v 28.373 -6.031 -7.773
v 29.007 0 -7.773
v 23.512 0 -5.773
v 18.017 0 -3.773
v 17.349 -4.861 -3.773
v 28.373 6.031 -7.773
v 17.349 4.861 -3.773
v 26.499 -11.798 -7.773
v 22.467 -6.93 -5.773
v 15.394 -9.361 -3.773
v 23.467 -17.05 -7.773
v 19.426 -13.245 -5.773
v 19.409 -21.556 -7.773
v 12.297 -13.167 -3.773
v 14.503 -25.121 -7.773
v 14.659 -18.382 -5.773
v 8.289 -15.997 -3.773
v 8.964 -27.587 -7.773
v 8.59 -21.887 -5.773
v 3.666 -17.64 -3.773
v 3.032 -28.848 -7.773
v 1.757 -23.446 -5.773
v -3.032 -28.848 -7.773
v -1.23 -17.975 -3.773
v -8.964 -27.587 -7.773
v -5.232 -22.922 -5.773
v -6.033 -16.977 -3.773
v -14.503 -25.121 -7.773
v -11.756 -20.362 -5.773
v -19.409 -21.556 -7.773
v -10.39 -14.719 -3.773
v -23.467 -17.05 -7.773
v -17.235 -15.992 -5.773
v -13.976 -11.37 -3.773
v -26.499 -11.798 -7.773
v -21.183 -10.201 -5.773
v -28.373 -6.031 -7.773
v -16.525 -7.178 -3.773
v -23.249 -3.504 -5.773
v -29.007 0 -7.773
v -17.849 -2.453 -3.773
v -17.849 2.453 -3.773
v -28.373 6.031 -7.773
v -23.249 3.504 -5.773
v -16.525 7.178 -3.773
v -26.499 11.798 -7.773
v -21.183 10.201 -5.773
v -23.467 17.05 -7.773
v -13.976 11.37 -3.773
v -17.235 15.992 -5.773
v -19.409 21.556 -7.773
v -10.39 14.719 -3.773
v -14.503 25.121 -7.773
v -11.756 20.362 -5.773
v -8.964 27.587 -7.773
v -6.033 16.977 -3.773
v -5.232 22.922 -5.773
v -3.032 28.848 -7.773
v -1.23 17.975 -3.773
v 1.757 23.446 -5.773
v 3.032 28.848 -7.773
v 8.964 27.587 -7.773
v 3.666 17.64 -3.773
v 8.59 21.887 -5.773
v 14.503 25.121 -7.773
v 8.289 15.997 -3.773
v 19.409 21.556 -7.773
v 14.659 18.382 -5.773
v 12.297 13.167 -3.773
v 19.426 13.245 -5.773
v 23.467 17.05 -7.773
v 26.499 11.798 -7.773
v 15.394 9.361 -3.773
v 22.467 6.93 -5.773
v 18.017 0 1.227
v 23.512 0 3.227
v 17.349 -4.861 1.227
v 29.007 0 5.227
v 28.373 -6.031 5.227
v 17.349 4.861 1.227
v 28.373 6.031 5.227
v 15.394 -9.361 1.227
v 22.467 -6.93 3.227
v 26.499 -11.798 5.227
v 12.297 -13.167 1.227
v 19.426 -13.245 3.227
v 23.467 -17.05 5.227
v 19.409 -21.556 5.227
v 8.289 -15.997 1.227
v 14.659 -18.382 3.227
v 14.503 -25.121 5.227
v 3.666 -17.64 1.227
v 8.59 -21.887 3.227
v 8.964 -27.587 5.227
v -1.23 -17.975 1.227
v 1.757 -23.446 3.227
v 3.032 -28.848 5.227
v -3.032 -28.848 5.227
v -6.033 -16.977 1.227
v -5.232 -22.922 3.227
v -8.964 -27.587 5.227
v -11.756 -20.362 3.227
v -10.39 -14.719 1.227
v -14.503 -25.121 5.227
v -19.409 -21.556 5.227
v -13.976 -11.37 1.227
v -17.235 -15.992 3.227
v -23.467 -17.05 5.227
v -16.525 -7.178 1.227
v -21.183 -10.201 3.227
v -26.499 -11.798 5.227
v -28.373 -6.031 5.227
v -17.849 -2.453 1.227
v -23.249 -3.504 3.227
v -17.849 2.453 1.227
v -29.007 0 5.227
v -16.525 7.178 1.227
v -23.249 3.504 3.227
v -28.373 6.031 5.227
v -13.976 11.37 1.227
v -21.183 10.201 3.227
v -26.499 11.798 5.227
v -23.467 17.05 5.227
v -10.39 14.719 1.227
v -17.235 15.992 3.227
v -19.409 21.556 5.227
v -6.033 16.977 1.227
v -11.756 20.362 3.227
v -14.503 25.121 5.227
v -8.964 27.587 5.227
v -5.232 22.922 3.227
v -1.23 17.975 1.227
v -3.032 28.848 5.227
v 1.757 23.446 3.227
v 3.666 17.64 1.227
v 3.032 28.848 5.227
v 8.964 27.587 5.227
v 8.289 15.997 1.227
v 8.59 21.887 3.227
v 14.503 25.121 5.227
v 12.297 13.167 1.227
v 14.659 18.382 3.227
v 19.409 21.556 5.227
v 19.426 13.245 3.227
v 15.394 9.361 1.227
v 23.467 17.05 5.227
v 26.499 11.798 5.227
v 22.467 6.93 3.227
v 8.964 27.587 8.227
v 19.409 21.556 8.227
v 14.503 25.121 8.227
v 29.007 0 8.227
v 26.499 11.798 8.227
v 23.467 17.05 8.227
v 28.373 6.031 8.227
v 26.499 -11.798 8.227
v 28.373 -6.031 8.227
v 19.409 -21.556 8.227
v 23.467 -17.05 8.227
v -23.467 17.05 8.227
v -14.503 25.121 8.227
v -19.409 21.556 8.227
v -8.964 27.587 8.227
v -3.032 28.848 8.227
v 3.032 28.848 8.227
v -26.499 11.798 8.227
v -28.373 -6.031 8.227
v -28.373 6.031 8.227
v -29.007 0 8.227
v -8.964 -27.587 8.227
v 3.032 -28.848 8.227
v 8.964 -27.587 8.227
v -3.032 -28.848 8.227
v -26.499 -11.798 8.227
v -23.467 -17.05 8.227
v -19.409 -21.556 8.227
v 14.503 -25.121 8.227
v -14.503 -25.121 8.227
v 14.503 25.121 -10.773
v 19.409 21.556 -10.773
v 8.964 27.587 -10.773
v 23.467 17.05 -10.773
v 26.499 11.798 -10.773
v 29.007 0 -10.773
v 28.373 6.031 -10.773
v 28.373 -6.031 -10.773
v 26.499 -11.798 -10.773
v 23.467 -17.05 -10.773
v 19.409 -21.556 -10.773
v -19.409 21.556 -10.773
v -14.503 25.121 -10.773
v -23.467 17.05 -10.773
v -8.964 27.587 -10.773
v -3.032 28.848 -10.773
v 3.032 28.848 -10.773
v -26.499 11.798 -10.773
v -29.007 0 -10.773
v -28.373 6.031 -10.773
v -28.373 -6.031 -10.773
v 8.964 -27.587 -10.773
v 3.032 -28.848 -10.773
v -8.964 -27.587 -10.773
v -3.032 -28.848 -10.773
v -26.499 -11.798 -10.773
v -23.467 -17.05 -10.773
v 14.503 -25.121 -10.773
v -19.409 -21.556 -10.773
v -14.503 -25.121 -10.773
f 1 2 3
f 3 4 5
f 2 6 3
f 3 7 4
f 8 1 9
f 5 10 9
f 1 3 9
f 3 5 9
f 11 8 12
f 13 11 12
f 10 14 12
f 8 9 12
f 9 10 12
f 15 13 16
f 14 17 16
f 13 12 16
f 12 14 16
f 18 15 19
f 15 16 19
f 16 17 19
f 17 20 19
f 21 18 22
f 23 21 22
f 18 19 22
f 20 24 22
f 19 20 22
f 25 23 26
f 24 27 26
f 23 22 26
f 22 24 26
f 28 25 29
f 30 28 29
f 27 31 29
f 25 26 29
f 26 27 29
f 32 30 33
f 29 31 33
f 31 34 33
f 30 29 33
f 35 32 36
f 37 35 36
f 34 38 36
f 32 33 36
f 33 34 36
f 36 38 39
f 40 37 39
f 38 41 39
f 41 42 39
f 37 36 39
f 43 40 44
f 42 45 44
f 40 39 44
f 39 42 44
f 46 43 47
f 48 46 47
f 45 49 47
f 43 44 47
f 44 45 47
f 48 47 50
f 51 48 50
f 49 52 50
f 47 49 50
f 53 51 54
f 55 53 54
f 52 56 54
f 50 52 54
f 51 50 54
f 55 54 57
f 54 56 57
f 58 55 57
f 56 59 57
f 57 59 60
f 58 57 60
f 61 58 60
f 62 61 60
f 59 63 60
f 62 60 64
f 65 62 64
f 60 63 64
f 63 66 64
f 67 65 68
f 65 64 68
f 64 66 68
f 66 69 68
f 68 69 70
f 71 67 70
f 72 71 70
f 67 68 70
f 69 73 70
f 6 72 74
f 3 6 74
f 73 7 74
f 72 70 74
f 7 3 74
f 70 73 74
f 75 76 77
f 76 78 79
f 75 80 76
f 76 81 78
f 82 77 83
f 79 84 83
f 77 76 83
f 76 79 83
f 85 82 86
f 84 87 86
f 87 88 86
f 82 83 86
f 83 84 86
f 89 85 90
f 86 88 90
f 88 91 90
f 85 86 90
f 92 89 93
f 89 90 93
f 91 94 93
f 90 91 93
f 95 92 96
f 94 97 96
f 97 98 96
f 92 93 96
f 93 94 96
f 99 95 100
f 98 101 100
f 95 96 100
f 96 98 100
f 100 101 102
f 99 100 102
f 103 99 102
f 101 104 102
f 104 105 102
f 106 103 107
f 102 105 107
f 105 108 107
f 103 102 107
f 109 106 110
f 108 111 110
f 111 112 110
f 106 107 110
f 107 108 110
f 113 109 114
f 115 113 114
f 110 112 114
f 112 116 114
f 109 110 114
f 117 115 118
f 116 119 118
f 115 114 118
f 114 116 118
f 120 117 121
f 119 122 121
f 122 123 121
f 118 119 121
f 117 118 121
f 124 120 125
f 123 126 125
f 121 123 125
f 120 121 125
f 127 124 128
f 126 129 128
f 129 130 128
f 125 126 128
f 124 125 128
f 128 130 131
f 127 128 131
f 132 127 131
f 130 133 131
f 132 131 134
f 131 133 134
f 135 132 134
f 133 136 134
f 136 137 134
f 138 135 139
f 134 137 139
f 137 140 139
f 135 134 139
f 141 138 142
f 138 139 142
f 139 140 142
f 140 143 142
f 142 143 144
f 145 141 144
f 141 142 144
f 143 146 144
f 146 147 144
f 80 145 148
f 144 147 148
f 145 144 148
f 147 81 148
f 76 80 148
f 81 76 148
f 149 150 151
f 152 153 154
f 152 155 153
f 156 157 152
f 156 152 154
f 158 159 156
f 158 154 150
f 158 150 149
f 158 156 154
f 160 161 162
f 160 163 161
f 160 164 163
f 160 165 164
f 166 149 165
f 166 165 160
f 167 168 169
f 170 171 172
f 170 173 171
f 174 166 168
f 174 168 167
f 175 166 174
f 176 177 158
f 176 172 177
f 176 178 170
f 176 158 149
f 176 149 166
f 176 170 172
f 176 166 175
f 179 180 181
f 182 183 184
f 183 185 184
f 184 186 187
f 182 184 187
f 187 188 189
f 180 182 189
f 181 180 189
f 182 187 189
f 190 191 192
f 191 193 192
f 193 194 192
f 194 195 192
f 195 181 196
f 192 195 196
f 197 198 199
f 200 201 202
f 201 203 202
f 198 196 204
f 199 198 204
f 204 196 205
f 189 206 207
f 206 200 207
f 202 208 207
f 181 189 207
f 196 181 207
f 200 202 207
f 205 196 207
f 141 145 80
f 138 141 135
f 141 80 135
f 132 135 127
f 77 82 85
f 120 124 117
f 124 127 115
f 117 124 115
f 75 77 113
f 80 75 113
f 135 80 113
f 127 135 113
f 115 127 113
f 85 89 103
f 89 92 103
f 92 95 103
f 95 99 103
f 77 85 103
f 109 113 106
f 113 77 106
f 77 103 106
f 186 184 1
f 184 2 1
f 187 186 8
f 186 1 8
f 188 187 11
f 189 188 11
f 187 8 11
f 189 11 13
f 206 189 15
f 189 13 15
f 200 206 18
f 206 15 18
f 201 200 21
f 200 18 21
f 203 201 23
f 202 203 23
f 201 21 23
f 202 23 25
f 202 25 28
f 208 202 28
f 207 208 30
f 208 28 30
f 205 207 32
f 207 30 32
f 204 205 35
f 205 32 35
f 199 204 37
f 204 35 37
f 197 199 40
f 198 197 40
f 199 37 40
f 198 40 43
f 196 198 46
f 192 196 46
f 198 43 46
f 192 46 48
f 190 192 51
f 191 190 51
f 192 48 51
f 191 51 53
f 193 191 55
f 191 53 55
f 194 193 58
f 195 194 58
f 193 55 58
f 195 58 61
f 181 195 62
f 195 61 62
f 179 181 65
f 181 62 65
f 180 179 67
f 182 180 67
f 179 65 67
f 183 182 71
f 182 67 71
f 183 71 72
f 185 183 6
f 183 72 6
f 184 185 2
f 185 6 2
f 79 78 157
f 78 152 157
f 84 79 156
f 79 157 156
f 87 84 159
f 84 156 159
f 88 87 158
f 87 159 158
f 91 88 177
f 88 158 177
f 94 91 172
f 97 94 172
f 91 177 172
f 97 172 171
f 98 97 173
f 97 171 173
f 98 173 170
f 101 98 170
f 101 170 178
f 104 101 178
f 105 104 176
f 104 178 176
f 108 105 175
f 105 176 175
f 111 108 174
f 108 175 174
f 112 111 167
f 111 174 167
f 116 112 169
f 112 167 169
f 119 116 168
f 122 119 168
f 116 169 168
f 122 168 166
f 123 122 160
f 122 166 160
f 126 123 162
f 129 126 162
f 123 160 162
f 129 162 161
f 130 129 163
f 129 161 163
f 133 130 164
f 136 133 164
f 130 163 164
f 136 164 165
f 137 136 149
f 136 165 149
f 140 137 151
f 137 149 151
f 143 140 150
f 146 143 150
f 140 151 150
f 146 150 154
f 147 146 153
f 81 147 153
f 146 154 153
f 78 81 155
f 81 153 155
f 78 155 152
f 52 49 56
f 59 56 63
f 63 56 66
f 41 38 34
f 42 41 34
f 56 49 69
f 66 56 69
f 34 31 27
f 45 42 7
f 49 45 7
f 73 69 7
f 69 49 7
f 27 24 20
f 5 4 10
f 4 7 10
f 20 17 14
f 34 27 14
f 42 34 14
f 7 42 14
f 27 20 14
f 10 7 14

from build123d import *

# Parameters (mm, degrees)
F0_W = 29.0068
F0_H = 3


with BuildPart() as f1:
    # F0 (on Front) → F1 (revolve)
    with BuildSketch(Plane.XZ):
        with Locations((14.5034, 6.726993)):
            Rectangle(F0_W, F0_H)
        with Locations((14.5034, -9.273007)):
            Rectangle(F0_W, F0_H)
        Polygon((18.01689, -3.773007), (0, -3.773007), (0, -7.773007), (29.0068, -7.773007), align=None)
        Polygon((29.0068, 5.226993), (0, 5.226993), (0, 1.226993), (18.01689, 1.226993), align=None)
    revolve(axis=Axis((0, 0, 18.431734), (0, 0, -1)))


solid = f1.part
